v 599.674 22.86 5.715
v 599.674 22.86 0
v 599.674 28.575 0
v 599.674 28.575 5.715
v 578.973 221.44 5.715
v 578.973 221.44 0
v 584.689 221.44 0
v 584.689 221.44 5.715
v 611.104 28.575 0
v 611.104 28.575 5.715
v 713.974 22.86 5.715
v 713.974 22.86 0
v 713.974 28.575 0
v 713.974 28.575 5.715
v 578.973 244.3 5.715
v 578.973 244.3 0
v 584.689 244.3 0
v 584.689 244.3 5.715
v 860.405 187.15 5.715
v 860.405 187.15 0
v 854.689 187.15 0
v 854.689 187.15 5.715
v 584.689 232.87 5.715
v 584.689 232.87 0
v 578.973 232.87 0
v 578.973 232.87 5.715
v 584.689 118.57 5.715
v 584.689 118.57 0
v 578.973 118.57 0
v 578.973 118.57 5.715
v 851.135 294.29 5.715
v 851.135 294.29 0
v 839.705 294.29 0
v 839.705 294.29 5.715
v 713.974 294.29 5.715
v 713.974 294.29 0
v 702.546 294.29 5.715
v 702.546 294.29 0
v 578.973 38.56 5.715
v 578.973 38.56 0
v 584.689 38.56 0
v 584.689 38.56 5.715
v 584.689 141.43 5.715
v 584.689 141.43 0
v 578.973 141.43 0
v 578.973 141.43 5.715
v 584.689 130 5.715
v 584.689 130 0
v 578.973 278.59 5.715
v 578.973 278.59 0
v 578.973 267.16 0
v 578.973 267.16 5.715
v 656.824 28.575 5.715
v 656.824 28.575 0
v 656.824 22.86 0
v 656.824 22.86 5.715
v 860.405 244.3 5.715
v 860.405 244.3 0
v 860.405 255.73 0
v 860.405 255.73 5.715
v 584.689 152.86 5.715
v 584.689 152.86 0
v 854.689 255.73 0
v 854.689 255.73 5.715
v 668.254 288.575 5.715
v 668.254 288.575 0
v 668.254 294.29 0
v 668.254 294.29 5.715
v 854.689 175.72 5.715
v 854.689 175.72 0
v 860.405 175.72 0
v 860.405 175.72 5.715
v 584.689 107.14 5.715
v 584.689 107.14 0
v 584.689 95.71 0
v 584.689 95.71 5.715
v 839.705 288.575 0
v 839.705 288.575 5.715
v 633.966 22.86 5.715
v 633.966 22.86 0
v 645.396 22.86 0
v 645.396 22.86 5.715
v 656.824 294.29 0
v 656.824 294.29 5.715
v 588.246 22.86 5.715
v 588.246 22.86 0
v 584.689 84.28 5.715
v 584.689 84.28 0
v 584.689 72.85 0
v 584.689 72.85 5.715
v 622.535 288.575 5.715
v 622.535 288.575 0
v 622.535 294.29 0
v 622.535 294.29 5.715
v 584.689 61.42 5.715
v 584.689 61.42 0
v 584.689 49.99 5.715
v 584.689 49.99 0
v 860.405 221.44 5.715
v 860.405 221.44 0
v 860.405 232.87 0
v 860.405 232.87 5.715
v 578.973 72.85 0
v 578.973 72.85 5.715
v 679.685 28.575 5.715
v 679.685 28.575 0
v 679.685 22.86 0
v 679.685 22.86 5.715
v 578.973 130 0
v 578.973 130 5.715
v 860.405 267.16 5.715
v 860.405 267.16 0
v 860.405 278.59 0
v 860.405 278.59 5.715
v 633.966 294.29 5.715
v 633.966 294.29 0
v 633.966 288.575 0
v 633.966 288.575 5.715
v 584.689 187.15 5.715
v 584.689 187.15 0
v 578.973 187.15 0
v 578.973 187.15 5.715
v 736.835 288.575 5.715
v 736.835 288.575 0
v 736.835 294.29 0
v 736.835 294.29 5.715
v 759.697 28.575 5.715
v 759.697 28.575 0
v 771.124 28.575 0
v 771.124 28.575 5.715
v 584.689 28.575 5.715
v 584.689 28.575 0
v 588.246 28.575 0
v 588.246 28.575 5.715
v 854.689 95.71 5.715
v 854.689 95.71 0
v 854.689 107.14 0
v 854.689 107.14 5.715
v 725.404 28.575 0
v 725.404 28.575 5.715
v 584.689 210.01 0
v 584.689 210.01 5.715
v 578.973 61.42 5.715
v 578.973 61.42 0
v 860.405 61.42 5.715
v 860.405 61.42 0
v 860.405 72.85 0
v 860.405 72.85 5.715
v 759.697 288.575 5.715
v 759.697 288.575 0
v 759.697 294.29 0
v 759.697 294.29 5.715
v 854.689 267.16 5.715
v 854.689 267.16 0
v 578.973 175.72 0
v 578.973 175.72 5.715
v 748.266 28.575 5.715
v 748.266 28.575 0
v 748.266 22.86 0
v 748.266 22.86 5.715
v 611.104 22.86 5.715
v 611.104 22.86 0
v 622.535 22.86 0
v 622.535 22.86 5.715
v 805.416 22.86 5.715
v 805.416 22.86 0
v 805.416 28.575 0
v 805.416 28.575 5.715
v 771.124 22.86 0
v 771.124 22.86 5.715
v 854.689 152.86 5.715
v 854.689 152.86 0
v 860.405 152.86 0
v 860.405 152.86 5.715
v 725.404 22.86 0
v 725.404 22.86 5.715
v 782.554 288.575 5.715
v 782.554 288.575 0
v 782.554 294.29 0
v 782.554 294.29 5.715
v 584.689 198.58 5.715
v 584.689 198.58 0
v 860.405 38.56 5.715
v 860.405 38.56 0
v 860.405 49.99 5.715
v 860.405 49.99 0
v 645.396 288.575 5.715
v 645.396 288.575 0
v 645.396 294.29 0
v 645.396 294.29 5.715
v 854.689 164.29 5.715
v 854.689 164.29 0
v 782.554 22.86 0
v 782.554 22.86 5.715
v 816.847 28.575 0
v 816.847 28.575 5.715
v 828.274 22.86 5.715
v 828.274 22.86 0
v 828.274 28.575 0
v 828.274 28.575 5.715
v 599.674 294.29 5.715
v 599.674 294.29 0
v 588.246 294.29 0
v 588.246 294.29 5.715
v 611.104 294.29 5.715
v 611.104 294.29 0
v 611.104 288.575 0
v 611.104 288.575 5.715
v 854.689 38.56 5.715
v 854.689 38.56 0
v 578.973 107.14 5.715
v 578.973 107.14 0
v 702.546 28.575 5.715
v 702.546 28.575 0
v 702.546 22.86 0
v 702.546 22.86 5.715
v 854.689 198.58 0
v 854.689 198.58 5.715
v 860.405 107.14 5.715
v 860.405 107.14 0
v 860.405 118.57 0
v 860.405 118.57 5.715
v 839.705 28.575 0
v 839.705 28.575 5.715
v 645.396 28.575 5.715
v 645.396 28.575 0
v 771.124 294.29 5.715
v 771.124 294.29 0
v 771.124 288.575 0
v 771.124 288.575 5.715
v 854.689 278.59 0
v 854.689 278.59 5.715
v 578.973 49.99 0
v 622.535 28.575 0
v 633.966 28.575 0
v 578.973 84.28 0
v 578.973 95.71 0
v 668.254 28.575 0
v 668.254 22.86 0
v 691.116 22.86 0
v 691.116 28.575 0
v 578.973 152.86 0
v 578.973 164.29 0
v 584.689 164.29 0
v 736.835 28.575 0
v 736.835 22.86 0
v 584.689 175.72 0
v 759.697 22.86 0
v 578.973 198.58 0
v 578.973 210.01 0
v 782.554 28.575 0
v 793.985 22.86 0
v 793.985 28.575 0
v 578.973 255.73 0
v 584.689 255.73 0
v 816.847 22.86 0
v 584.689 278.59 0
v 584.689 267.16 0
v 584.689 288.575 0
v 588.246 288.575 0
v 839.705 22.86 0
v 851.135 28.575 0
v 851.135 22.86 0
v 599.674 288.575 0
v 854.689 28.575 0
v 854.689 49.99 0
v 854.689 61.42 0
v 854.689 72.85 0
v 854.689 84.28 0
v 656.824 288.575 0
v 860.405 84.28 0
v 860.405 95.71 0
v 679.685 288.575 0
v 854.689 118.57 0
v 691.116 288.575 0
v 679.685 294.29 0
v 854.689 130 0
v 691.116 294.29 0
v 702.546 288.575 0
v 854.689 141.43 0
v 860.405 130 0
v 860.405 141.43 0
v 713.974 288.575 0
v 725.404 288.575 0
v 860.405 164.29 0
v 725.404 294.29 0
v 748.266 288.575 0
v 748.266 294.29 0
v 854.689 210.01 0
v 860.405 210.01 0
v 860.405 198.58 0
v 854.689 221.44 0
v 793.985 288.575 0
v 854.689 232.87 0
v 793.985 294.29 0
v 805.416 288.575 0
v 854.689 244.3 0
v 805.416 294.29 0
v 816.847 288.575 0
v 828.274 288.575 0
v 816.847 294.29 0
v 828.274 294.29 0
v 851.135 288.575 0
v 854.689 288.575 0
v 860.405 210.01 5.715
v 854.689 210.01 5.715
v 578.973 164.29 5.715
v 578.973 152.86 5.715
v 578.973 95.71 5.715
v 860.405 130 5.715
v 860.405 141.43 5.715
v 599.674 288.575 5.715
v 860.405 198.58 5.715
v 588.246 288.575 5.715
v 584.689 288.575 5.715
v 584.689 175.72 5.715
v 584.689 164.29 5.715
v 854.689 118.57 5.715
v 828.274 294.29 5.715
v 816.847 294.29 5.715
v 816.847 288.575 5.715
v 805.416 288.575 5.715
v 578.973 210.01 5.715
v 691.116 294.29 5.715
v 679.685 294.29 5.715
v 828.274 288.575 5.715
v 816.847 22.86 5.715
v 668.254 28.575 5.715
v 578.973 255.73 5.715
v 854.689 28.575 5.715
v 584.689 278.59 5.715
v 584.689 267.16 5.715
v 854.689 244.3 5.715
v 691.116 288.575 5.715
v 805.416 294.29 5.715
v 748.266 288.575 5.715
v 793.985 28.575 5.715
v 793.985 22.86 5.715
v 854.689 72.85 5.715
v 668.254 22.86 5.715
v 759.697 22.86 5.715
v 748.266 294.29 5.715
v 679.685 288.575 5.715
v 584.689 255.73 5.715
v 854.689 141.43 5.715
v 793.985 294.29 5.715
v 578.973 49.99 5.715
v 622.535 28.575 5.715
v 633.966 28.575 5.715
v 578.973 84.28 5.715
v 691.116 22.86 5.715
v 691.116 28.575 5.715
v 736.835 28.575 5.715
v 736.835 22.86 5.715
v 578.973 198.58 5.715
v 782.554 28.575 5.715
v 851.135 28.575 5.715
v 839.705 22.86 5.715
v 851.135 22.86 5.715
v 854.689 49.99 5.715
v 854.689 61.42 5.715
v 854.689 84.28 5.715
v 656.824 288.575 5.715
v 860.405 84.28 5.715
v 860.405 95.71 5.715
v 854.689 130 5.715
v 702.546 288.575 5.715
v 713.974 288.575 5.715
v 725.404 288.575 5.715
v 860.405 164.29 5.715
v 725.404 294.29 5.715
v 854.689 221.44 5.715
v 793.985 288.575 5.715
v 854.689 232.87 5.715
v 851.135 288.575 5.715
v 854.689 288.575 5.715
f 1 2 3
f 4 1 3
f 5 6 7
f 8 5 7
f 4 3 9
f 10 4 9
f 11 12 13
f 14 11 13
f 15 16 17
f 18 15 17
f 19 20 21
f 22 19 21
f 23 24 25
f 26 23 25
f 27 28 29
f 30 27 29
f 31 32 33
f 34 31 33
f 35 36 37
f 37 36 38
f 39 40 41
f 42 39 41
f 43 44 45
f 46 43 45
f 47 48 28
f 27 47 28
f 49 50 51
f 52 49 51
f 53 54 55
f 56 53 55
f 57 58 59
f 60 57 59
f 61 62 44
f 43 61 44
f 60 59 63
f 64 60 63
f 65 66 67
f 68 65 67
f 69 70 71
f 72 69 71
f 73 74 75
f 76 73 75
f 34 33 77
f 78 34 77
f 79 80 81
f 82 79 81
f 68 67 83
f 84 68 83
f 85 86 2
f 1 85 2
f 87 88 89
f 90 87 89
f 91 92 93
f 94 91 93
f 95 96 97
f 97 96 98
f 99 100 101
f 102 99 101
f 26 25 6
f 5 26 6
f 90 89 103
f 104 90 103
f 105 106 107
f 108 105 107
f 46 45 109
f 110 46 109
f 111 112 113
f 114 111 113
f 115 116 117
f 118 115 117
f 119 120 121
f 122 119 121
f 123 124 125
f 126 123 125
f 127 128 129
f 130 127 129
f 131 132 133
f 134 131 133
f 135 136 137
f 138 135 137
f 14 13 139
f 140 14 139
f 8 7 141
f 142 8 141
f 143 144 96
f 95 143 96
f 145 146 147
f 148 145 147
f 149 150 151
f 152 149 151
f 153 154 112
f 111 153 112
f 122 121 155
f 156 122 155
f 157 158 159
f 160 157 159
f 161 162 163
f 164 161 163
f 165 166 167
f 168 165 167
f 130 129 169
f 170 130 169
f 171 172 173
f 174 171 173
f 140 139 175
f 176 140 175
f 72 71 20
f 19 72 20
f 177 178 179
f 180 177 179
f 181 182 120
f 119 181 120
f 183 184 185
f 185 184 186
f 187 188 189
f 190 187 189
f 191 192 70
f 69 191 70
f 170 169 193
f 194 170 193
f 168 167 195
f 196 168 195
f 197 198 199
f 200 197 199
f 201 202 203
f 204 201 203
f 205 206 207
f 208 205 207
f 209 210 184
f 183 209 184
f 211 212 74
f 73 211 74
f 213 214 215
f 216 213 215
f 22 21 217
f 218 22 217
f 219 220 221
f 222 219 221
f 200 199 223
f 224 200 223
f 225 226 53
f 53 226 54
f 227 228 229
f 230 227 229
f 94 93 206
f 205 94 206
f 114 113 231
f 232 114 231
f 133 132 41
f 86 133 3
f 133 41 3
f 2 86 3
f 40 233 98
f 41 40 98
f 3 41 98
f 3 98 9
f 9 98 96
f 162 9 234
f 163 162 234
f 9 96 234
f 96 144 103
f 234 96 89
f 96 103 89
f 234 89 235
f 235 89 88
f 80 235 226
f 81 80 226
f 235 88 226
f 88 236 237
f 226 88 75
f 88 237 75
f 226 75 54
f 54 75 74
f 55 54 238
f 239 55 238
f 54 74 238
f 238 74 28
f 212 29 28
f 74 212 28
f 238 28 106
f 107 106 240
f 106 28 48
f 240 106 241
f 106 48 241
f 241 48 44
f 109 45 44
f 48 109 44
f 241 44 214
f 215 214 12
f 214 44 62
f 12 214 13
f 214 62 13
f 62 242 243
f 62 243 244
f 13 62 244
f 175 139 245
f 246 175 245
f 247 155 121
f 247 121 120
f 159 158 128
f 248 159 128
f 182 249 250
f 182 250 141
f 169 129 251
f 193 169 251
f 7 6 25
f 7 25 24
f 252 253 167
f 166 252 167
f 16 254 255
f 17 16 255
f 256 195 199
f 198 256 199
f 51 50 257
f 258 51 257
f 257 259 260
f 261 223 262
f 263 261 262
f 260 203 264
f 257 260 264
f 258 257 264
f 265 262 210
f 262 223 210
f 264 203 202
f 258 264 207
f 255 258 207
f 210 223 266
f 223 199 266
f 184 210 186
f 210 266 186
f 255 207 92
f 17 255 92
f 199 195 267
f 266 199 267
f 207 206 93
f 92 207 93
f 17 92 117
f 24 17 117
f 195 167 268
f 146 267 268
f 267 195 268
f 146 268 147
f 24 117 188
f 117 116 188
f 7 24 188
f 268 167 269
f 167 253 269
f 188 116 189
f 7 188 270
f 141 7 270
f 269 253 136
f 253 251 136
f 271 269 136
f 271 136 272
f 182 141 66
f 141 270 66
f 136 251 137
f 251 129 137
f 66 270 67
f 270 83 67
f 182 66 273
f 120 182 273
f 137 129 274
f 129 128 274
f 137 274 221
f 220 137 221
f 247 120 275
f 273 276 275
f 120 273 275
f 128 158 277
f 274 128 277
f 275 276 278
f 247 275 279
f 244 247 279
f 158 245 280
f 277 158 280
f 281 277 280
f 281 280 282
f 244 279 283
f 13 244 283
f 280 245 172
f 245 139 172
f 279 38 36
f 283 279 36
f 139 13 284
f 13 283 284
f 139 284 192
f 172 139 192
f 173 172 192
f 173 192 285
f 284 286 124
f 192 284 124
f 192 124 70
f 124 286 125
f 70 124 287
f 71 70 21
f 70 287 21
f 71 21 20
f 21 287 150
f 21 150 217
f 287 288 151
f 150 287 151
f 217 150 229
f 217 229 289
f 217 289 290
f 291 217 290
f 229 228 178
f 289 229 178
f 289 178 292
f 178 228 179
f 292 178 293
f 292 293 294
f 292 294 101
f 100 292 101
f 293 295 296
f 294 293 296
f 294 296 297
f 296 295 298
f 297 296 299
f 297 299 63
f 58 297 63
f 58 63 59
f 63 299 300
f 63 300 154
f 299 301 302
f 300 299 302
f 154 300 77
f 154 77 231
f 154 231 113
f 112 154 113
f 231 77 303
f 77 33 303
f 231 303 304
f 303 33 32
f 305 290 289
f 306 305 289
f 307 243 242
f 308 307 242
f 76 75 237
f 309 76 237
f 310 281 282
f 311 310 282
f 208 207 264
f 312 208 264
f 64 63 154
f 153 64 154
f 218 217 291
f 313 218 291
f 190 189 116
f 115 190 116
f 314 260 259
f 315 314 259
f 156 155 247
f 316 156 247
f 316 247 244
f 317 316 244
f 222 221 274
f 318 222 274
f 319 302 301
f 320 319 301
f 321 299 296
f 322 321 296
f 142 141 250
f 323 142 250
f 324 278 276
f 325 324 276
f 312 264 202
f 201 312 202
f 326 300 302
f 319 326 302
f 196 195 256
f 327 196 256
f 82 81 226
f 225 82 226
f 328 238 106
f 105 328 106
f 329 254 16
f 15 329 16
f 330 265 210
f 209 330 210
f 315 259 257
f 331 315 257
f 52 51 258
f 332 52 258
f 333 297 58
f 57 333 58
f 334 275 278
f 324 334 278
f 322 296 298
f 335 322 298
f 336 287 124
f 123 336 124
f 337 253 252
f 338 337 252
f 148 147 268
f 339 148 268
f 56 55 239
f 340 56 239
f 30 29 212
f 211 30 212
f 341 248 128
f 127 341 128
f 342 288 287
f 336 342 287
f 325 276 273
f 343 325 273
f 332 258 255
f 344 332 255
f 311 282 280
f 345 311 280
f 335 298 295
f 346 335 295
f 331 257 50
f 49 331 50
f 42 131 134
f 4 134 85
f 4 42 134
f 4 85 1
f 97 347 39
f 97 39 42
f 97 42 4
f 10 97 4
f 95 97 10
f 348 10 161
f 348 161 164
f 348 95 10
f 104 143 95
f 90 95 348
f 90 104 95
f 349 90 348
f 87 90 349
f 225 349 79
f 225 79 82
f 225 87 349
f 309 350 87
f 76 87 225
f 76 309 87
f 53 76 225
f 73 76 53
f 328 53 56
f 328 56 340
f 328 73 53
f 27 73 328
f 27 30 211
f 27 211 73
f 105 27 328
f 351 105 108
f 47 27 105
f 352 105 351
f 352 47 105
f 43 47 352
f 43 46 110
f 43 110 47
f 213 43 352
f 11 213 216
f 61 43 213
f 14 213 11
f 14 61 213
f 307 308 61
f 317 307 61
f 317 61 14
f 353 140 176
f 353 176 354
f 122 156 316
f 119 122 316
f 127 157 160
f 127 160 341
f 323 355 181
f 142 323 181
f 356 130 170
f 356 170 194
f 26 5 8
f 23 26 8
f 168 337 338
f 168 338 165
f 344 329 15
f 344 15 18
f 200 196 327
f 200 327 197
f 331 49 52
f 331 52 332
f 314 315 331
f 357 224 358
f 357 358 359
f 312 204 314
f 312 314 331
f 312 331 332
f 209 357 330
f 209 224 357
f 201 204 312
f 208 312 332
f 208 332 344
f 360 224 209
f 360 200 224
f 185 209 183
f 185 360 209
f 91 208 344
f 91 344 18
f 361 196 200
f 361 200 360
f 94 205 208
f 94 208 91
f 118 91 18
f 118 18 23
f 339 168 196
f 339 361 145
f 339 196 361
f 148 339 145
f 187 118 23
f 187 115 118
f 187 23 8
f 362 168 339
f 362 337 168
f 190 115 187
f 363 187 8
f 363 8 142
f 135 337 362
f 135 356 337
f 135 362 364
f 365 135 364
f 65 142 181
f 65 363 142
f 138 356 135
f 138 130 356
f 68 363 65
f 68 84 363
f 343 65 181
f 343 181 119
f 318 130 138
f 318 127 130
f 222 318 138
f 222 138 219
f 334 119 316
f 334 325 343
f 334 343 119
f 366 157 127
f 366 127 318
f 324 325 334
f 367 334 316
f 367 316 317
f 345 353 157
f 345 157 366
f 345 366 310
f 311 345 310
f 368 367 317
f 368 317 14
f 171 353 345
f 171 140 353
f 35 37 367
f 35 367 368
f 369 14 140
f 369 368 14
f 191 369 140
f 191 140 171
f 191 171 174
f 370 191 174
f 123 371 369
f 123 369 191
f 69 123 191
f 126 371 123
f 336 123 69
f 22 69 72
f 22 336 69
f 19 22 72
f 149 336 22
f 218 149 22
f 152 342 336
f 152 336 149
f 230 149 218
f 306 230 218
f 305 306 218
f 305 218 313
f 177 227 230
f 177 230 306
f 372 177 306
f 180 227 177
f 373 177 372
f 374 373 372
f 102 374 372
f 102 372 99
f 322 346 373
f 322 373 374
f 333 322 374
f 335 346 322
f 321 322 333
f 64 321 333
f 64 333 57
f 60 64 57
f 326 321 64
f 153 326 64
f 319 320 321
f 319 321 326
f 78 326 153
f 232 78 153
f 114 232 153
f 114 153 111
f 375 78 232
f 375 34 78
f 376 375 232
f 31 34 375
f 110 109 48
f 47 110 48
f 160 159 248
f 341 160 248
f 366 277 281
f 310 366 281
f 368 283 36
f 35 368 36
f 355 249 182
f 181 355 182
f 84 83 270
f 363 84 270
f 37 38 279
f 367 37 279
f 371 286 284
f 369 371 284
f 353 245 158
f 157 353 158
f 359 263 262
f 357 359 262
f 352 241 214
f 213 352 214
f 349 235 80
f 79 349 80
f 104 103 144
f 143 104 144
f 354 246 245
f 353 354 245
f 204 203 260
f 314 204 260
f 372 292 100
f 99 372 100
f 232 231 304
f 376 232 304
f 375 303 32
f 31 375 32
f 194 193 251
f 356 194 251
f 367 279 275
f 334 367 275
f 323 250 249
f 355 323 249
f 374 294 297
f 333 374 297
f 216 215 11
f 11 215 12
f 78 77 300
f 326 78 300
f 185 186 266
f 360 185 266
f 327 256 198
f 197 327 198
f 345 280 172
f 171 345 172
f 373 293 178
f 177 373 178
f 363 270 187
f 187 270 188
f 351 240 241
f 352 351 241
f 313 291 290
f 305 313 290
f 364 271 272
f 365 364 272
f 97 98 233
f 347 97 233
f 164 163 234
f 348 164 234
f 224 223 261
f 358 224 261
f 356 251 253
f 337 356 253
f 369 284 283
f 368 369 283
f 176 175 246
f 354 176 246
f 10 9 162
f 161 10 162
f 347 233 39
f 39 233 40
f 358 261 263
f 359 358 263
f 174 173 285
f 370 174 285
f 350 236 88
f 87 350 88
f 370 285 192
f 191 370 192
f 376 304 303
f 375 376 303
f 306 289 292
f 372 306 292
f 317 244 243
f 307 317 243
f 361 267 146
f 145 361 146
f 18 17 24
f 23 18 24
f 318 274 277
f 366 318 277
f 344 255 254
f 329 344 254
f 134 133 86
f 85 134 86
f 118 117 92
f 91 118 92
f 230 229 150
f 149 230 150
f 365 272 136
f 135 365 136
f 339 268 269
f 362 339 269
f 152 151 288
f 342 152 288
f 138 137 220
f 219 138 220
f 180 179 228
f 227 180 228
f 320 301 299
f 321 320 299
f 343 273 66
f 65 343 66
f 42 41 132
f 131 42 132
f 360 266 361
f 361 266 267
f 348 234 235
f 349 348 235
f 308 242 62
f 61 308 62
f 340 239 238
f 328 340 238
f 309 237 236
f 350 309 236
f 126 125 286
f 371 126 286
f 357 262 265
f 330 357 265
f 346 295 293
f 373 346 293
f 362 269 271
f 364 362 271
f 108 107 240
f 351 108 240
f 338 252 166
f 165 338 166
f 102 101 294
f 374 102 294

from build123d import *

# Parameters (mm, degrees)
BOSS_EXTRUDE1_DEPTH = 5.715


with BuildPart() as part:
    # Model → Boss-Extrude1 (new body)
    with BuildSketch(Plane.XY):
        Polygon((584.688856535, 28.575245224), (588.246340911, 28.575245224), (588.246340911, 22.860238699), (599.673519312, 22.860238699), (599.673519312, 28.575245224), (611.104241025, 28.575245224), (611.104241025, 22.860238699), (622.534962737, 22.860238699), (622.534962737, 28.575245224), (633.965684449, 28.575245224), (633.965684449, 22.860238699), (645.396406161, 22.860238699), (645.396406161, 28.575245224), (656.823584562, 28.575245224), (656.823584562, 22.860238699), (668.254306275, 22.860238699), (668.254306275, 28.575245224), (679.685027987, 28.575245224), (679.685027987, 22.860238699), (691.115749699, 22.860238699), (691.115749699, 28.575245224), (702.546471411, 28.575245224), (702.546471411, 22.860238699), (713.973649812, 22.860238699), (713.973649812, 28.575245224), (725.404371525, 28.575245224), (725.404371525, 22.860238699), (736.835093237, 22.860238699), (736.835093237, 28.575245224), (748.265814949, 28.575245224), (748.265814949, 22.860238699), (759.696536661, 22.860238699), (759.696536661, 28.575245224), (771.123715063, 28.575245224), (771.123715063, 22.860238699), (782.554436775, 22.860238699), (782.554436775, 28.575245224), (793.985158487, 28.575245224), (793.985158487, 22.860238699), (805.415880199, 22.860238699), (805.415880199, 28.575245224), (816.846601911, 28.575245224), (816.846601911, 22.860238699), (828.273780313, 22.860238699), (828.273780313, 28.575245224), (839.704502025, 28.575245224), (839.704502025, 22.860238699), (851.135223737, 22.860238699), (851.135223737, 28.575245224), (854.689164803, 28.575245224), (854.689164803, 38.560083395), (860.404525659, 38.560083395), (860.404525659, 49.990096445), (854.689164803, 49.990096445), (854.689164803, 61.420109495), (860.404525659, 61.420109495), (860.404525659, 72.850122545), (854.689164803, 72.850122545), (854.689164803, 84.280135595), (860.404525659, 84.280135595), (860.404525659, 95.710148645), (854.689164803, 95.710148645), (854.689164803, 107.140161695), (860.404525659, 107.140161695), (860.404525659, 118.570174745), (854.689164803, 118.570174745), (854.689164803, 130.000187795), (860.404525659, 130.000187795), (860.404525659, 141.430200846), (854.689164803, 141.430200846), (854.689164803, 152.860213896), (860.404525659, 152.860213896), (860.404525659, 164.290226946), (854.689164803, 164.290226946), (854.689164803, 175.720239996), (860.404525659, 175.720239996), (860.404525659, 187.150253046), (854.689164803, 187.150253046), (854.689164803, 198.580266096), (860.404525659, 198.580266096), (860.404525659, 210.010279146), (854.689164803, 210.010279146), (854.689164803, 221.440292196), (860.404525659, 221.440292196), (860.404525659, 232.870305246), (854.689164803, 232.870305246), (854.689164803, 244.300318296), (860.404525659, 244.300318296), (860.404525659, 255.730331346), (854.689164803, 255.730331346), (854.689164803, 267.160344396), (860.404525659, 267.160344396), (860.404525659, 278.590357446), (854.689164803, 278.590357446), (854.689164803, 288.575408216), (851.135223737, 288.575408216), (851.135223737, 294.290414741), (839.704502025, 294.290414741), (839.704502025, 288.575408216), (828.273780313, 288.575408216), (828.273780313, 294.290414741), (816.846601911, 294.290414741), (816.846601911, 288.575408216), (805.415880199, 288.575408216), (805.415880199, 294.290414741), (793.985158487, 294.290414741), (793.985158487, 288.575408216), (782.554436775, 288.575408216), (782.554436775, 294.290414741), (771.123715063, 294.290414741), (771.123715063, 288.575408216), (759.696536661, 288.575408216), (759.696536661, 294.290414741), (748.265814949, 294.290414741), (748.265814949, 288.575408216), (736.835093237, 288.575408216), (736.835093237, 294.290414741), (725.404371525, 294.290414741), (725.404371525, 288.575408216), (713.973649812, 288.575408216), (713.973649812, 294.290414741), (702.546471411, 294.290414741), (702.546471411, 288.575408216), (691.115749699, 288.575408216), (691.115749699, 294.290414741), (679.685027987, 294.290414741), (679.685027987, 288.575408216), (668.254306275, 288.575408216), (668.254306275, 294.290414741), (656.823584562, 294.290414741), (656.823584562, 288.575408216), (645.396406161, 288.575408216), (645.396406161, 294.290414741), (633.965684449, 294.290414741), (633.965684449, 288.575408216), (622.534962737, 288.575408216), (622.534962737, 294.290414741), (611.104241025, 294.290414741), (611.104241025, 288.575408216), (599.673519312, 288.575408216), (599.673519312, 294.290414741), (588.246340911, 294.290414741), (588.246340911, 288.575408216), (584.688856535, 288.575408216), (584.688856535, 278.590357446), (578.973495678, 278.590357446), (578.973495678, 267.160344396), (584.688856535, 267.160344396), (584.688856535, 255.730331346), (578.973495678, 255.730331346), (578.973495678, 244.300318296), (584.688856535, 244.300318296), (584.688856535, 232.870305246), (578.973495678, 232.870305246), (578.973495678, 221.440292196), (584.688856535, 221.440292196), (584.688856535, 210.010279146), (578.973495678, 210.010279146), (578.973495678, 198.580266096), (584.688856535, 198.580266096), (584.688856535, 187.150253046), (578.973495678, 187.150253046), (578.973495678, 175.720239996), (584.688856535, 175.720239996), (584.688856535, 164.290226946), (578.973495678, 164.290226946), (578.973495678, 152.860213896), (584.688856535, 152.860213896), (584.688856535, 141.430200846), (578.973495678, 141.430200846), (578.973495678, 130.000187795), (584.688856535, 130.000187795), (584.688856535, 118.570174745), (578.973495678, 118.570174745), (578.973495678, 107.140161695), (584.688856535, 107.140161695), (584.688856535, 95.710148645), (578.973495678, 95.710148645), (578.973495678, 84.280135595), (584.688856535, 84.280135595), (584.688856535, 72.850122545), (578.973495678, 72.850122545), (578.973495678, 61.420109495), (584.688856535, 61.420109495), (584.688856535, 49.990096445), (578.973495678, 49.990096445), (578.973495678, 38.560083395), (584.688856535, 38.560083395), align=None)
    extrude(amount=BOSS_EXTRUDE1_DEPTH)


solid = part.part
